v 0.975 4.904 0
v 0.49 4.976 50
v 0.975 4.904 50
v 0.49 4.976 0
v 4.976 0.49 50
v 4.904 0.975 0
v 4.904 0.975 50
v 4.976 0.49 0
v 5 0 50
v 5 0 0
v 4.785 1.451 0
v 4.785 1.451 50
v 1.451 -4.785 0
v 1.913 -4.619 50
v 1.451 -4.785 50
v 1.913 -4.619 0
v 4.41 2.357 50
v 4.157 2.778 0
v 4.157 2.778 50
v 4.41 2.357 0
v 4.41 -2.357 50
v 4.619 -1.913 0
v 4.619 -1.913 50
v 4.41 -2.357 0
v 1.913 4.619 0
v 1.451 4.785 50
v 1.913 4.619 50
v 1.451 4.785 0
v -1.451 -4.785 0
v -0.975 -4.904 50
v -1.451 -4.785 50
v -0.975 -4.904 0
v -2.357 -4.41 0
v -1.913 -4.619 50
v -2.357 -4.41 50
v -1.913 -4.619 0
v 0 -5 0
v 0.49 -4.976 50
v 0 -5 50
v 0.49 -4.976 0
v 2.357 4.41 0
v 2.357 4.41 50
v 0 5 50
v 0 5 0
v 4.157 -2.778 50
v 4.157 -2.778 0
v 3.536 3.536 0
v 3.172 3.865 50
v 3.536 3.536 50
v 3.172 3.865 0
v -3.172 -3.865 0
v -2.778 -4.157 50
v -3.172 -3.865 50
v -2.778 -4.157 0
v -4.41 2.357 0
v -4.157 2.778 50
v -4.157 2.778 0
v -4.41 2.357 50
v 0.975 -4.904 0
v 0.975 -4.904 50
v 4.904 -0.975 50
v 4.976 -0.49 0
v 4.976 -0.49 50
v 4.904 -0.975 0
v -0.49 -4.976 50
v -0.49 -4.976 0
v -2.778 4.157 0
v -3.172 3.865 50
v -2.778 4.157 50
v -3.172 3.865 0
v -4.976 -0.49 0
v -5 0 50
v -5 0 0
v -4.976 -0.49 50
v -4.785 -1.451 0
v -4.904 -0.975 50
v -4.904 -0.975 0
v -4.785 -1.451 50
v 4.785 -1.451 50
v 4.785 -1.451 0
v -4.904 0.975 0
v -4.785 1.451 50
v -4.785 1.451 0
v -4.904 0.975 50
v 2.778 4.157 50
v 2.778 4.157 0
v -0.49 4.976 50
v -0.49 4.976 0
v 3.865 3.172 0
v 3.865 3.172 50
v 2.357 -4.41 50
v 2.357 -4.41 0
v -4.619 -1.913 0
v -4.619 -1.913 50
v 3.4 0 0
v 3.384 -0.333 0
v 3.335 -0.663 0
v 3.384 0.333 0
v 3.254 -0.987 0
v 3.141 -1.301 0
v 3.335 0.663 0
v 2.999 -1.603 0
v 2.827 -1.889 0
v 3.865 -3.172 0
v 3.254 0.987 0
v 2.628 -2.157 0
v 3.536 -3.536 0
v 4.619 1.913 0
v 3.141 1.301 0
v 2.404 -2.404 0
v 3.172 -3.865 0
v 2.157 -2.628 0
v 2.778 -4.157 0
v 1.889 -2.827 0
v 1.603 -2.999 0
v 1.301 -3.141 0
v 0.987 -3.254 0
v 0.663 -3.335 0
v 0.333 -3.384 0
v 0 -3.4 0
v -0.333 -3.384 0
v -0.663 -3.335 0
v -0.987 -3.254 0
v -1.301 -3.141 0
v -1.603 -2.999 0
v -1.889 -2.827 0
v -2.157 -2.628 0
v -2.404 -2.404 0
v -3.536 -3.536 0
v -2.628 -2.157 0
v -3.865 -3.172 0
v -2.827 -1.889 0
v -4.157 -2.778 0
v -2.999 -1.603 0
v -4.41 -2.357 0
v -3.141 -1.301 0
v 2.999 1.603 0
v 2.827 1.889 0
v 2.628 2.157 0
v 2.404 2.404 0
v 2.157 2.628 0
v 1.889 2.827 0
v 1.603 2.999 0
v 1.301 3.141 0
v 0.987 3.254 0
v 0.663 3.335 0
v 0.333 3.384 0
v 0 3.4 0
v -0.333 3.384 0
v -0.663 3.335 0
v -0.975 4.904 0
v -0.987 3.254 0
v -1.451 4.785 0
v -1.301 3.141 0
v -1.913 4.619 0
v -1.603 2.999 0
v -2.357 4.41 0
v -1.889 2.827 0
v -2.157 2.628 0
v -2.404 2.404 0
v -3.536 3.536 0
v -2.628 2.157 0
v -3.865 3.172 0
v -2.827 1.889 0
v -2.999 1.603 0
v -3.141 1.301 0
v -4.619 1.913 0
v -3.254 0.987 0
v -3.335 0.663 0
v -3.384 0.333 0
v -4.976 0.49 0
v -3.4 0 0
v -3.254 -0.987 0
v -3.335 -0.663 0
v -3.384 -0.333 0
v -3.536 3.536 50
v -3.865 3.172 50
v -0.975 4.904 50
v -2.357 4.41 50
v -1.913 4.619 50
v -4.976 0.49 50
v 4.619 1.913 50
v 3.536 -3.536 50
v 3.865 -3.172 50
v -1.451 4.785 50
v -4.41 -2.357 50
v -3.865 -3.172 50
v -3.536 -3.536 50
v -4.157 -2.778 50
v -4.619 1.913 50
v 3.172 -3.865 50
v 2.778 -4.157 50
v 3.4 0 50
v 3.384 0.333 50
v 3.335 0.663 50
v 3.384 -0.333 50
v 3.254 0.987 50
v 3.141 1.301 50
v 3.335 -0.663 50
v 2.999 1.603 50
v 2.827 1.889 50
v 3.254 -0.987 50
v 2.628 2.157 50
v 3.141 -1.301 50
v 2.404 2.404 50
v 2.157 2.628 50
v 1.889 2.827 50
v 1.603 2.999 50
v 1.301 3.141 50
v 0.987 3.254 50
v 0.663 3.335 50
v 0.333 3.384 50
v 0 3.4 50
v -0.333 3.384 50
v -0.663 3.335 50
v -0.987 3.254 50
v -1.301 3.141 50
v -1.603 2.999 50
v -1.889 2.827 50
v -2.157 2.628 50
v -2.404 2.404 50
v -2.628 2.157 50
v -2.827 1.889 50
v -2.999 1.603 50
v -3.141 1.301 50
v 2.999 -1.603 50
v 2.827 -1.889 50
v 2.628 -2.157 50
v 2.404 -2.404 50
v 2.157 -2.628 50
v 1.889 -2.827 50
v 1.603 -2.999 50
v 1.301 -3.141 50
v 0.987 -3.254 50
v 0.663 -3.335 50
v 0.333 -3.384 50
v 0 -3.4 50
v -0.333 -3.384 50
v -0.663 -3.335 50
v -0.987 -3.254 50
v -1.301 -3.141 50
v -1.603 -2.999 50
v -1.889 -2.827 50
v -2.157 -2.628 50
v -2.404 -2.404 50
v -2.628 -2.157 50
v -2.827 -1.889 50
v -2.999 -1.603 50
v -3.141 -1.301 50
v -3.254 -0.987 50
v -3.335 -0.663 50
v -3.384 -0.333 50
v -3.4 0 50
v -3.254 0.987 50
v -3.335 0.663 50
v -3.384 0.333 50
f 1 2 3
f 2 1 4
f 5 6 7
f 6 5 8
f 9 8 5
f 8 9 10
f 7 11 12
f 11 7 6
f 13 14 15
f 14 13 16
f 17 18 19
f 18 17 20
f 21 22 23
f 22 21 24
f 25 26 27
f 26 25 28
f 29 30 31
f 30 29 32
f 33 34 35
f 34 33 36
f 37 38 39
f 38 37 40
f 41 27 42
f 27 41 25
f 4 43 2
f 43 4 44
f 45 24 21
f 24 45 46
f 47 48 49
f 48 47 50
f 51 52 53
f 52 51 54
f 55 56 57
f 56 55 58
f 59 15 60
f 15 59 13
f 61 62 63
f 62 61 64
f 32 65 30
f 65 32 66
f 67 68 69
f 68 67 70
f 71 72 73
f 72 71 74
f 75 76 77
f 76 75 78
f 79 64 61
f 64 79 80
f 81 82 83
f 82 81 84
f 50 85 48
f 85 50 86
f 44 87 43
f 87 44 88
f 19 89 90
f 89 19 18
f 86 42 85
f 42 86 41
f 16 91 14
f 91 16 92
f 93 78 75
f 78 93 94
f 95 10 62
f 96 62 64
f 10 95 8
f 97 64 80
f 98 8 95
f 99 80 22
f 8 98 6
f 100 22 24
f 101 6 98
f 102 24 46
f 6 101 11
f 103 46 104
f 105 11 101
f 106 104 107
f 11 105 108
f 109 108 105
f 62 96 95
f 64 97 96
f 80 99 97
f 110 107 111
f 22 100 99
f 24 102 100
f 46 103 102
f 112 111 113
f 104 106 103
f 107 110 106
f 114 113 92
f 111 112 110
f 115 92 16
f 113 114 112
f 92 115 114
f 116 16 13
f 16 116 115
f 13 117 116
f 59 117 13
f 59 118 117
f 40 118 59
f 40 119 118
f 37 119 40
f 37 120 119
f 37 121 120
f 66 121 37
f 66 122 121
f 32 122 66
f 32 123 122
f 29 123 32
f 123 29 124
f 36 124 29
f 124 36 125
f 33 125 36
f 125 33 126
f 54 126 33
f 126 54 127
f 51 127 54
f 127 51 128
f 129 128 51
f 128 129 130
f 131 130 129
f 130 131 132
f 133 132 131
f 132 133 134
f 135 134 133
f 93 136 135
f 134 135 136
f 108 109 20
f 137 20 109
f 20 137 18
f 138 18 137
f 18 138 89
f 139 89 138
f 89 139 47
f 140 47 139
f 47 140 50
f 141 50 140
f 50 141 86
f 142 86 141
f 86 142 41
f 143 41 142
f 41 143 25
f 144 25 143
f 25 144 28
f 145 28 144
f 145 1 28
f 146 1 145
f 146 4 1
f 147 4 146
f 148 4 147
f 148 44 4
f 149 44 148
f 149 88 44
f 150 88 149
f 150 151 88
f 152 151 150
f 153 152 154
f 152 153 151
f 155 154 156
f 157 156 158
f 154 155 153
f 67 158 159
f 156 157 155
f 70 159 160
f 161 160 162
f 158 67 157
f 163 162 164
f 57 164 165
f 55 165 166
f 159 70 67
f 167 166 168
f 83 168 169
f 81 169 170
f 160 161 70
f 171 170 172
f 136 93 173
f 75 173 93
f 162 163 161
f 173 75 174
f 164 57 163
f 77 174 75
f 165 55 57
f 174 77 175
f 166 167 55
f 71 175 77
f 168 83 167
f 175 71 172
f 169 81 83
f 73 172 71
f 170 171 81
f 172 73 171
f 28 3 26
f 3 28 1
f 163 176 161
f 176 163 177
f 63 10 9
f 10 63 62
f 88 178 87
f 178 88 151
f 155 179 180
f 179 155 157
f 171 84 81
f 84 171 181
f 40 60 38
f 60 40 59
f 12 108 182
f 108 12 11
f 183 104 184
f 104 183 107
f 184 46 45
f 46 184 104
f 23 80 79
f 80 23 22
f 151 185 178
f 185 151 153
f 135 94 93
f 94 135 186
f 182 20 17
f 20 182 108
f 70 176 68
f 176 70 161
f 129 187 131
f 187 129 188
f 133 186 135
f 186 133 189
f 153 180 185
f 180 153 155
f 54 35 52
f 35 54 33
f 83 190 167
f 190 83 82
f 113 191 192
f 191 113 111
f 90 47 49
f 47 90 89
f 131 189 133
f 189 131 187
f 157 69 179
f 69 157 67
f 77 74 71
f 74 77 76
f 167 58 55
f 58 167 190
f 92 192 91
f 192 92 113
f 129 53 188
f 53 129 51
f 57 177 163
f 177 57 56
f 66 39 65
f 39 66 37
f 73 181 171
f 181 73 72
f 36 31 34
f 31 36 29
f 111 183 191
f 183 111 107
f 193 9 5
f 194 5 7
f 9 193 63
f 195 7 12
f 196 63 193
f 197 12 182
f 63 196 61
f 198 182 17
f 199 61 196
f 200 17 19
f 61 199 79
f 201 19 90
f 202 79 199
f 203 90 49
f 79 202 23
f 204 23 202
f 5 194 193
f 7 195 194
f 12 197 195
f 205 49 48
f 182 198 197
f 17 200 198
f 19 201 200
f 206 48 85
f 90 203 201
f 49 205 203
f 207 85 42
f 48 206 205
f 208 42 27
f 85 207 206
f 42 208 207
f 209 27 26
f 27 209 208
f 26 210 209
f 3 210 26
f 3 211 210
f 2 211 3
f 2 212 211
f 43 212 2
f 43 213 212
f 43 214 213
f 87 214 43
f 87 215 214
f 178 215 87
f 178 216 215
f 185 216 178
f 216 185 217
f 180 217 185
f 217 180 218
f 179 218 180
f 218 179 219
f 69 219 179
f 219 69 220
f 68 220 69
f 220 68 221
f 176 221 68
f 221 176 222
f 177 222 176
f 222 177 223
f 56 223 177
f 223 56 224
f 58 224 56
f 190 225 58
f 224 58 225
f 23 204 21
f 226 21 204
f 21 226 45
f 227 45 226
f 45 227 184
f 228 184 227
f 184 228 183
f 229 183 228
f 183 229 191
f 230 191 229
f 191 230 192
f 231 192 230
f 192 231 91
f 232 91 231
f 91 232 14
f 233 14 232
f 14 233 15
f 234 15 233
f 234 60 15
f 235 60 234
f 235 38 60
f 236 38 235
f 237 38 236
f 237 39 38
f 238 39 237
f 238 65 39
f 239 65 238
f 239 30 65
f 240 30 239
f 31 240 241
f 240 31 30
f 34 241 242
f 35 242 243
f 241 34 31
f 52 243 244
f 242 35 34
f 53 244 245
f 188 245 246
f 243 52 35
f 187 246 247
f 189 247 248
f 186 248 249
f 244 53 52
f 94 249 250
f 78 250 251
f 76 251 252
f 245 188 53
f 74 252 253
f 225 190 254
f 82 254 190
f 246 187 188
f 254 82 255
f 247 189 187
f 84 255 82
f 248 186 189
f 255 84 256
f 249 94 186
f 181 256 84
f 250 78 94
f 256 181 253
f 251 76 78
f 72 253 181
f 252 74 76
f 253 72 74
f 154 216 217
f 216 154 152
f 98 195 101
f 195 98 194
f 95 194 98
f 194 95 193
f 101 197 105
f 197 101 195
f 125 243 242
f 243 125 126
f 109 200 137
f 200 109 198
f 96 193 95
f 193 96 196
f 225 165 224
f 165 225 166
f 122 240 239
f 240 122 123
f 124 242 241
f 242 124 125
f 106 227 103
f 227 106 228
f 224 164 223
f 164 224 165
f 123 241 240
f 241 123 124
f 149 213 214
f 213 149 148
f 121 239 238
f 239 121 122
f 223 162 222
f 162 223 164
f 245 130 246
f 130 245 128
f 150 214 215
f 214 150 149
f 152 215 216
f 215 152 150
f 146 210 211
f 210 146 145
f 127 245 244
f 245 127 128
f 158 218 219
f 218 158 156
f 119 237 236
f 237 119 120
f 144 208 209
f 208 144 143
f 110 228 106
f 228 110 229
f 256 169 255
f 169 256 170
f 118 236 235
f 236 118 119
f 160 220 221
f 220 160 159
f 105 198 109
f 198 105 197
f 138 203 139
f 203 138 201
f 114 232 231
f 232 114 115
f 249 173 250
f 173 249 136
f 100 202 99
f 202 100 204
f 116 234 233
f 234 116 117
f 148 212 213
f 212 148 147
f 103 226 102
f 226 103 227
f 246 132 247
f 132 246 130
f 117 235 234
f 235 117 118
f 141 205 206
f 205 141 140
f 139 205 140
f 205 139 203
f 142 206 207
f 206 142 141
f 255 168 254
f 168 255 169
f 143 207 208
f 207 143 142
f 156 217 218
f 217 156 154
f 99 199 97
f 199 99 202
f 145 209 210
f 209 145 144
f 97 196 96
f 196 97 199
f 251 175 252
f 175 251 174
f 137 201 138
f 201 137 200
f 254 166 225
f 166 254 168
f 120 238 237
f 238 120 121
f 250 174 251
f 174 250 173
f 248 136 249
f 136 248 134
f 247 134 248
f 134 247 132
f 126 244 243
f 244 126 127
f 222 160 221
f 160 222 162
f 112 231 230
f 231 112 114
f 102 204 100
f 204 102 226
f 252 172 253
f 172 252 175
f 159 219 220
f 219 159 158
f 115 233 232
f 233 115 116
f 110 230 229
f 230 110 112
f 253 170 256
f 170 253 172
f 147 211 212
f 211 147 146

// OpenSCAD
// Lab funnel - printed upright, wide opening at top
// Units: mm

$fn = 64;

// --- Dimensions ---
spout_od      = 10;   // spout outer diameter
spout_h       = 20;   // spout height (z = 0 to 20)
spout_bore    = 6.8;  // spout bore (od 10, wall 1.6)

cone_od_bottom = 10;  // cone outer diameter at z = 20
cone_od_top    = 60;  // cone outer diameter at rim (z = 50)
cone_h        = 30;   // cone height (z = 20 to 50)

wall          = 1.6;  // wall thickness everywhere

// --- Derived ---
spout_r_out   = spout_od / 2;
spout_r_in    = spout_bore / 2;
cone_r_bottom = cone_od_bottom / 2;
cone_r_top    = cone_od_top / 2;

// --- Model ---
difference() {
    union() {
        // Spout
        cylinder(h = spout_h, r = spout_r_out);

        // Cone (slightly overlapping spout for a clean union)
        translate([0, 0, spout_h - 0.01])
            linear_extrude(height = cone_h + 0.01)
                circle(r = cone_r_bottom);

        // Rim
        translate([0, 0, spout_h + cone_h])
            circle(r = cone_r_top);
    }

    // Through-bore from bottom up to rim height
    translate([0, 0, -1])
        cylinder(h = spout_h + cone_h + 2, r = spout_r_in);
}
